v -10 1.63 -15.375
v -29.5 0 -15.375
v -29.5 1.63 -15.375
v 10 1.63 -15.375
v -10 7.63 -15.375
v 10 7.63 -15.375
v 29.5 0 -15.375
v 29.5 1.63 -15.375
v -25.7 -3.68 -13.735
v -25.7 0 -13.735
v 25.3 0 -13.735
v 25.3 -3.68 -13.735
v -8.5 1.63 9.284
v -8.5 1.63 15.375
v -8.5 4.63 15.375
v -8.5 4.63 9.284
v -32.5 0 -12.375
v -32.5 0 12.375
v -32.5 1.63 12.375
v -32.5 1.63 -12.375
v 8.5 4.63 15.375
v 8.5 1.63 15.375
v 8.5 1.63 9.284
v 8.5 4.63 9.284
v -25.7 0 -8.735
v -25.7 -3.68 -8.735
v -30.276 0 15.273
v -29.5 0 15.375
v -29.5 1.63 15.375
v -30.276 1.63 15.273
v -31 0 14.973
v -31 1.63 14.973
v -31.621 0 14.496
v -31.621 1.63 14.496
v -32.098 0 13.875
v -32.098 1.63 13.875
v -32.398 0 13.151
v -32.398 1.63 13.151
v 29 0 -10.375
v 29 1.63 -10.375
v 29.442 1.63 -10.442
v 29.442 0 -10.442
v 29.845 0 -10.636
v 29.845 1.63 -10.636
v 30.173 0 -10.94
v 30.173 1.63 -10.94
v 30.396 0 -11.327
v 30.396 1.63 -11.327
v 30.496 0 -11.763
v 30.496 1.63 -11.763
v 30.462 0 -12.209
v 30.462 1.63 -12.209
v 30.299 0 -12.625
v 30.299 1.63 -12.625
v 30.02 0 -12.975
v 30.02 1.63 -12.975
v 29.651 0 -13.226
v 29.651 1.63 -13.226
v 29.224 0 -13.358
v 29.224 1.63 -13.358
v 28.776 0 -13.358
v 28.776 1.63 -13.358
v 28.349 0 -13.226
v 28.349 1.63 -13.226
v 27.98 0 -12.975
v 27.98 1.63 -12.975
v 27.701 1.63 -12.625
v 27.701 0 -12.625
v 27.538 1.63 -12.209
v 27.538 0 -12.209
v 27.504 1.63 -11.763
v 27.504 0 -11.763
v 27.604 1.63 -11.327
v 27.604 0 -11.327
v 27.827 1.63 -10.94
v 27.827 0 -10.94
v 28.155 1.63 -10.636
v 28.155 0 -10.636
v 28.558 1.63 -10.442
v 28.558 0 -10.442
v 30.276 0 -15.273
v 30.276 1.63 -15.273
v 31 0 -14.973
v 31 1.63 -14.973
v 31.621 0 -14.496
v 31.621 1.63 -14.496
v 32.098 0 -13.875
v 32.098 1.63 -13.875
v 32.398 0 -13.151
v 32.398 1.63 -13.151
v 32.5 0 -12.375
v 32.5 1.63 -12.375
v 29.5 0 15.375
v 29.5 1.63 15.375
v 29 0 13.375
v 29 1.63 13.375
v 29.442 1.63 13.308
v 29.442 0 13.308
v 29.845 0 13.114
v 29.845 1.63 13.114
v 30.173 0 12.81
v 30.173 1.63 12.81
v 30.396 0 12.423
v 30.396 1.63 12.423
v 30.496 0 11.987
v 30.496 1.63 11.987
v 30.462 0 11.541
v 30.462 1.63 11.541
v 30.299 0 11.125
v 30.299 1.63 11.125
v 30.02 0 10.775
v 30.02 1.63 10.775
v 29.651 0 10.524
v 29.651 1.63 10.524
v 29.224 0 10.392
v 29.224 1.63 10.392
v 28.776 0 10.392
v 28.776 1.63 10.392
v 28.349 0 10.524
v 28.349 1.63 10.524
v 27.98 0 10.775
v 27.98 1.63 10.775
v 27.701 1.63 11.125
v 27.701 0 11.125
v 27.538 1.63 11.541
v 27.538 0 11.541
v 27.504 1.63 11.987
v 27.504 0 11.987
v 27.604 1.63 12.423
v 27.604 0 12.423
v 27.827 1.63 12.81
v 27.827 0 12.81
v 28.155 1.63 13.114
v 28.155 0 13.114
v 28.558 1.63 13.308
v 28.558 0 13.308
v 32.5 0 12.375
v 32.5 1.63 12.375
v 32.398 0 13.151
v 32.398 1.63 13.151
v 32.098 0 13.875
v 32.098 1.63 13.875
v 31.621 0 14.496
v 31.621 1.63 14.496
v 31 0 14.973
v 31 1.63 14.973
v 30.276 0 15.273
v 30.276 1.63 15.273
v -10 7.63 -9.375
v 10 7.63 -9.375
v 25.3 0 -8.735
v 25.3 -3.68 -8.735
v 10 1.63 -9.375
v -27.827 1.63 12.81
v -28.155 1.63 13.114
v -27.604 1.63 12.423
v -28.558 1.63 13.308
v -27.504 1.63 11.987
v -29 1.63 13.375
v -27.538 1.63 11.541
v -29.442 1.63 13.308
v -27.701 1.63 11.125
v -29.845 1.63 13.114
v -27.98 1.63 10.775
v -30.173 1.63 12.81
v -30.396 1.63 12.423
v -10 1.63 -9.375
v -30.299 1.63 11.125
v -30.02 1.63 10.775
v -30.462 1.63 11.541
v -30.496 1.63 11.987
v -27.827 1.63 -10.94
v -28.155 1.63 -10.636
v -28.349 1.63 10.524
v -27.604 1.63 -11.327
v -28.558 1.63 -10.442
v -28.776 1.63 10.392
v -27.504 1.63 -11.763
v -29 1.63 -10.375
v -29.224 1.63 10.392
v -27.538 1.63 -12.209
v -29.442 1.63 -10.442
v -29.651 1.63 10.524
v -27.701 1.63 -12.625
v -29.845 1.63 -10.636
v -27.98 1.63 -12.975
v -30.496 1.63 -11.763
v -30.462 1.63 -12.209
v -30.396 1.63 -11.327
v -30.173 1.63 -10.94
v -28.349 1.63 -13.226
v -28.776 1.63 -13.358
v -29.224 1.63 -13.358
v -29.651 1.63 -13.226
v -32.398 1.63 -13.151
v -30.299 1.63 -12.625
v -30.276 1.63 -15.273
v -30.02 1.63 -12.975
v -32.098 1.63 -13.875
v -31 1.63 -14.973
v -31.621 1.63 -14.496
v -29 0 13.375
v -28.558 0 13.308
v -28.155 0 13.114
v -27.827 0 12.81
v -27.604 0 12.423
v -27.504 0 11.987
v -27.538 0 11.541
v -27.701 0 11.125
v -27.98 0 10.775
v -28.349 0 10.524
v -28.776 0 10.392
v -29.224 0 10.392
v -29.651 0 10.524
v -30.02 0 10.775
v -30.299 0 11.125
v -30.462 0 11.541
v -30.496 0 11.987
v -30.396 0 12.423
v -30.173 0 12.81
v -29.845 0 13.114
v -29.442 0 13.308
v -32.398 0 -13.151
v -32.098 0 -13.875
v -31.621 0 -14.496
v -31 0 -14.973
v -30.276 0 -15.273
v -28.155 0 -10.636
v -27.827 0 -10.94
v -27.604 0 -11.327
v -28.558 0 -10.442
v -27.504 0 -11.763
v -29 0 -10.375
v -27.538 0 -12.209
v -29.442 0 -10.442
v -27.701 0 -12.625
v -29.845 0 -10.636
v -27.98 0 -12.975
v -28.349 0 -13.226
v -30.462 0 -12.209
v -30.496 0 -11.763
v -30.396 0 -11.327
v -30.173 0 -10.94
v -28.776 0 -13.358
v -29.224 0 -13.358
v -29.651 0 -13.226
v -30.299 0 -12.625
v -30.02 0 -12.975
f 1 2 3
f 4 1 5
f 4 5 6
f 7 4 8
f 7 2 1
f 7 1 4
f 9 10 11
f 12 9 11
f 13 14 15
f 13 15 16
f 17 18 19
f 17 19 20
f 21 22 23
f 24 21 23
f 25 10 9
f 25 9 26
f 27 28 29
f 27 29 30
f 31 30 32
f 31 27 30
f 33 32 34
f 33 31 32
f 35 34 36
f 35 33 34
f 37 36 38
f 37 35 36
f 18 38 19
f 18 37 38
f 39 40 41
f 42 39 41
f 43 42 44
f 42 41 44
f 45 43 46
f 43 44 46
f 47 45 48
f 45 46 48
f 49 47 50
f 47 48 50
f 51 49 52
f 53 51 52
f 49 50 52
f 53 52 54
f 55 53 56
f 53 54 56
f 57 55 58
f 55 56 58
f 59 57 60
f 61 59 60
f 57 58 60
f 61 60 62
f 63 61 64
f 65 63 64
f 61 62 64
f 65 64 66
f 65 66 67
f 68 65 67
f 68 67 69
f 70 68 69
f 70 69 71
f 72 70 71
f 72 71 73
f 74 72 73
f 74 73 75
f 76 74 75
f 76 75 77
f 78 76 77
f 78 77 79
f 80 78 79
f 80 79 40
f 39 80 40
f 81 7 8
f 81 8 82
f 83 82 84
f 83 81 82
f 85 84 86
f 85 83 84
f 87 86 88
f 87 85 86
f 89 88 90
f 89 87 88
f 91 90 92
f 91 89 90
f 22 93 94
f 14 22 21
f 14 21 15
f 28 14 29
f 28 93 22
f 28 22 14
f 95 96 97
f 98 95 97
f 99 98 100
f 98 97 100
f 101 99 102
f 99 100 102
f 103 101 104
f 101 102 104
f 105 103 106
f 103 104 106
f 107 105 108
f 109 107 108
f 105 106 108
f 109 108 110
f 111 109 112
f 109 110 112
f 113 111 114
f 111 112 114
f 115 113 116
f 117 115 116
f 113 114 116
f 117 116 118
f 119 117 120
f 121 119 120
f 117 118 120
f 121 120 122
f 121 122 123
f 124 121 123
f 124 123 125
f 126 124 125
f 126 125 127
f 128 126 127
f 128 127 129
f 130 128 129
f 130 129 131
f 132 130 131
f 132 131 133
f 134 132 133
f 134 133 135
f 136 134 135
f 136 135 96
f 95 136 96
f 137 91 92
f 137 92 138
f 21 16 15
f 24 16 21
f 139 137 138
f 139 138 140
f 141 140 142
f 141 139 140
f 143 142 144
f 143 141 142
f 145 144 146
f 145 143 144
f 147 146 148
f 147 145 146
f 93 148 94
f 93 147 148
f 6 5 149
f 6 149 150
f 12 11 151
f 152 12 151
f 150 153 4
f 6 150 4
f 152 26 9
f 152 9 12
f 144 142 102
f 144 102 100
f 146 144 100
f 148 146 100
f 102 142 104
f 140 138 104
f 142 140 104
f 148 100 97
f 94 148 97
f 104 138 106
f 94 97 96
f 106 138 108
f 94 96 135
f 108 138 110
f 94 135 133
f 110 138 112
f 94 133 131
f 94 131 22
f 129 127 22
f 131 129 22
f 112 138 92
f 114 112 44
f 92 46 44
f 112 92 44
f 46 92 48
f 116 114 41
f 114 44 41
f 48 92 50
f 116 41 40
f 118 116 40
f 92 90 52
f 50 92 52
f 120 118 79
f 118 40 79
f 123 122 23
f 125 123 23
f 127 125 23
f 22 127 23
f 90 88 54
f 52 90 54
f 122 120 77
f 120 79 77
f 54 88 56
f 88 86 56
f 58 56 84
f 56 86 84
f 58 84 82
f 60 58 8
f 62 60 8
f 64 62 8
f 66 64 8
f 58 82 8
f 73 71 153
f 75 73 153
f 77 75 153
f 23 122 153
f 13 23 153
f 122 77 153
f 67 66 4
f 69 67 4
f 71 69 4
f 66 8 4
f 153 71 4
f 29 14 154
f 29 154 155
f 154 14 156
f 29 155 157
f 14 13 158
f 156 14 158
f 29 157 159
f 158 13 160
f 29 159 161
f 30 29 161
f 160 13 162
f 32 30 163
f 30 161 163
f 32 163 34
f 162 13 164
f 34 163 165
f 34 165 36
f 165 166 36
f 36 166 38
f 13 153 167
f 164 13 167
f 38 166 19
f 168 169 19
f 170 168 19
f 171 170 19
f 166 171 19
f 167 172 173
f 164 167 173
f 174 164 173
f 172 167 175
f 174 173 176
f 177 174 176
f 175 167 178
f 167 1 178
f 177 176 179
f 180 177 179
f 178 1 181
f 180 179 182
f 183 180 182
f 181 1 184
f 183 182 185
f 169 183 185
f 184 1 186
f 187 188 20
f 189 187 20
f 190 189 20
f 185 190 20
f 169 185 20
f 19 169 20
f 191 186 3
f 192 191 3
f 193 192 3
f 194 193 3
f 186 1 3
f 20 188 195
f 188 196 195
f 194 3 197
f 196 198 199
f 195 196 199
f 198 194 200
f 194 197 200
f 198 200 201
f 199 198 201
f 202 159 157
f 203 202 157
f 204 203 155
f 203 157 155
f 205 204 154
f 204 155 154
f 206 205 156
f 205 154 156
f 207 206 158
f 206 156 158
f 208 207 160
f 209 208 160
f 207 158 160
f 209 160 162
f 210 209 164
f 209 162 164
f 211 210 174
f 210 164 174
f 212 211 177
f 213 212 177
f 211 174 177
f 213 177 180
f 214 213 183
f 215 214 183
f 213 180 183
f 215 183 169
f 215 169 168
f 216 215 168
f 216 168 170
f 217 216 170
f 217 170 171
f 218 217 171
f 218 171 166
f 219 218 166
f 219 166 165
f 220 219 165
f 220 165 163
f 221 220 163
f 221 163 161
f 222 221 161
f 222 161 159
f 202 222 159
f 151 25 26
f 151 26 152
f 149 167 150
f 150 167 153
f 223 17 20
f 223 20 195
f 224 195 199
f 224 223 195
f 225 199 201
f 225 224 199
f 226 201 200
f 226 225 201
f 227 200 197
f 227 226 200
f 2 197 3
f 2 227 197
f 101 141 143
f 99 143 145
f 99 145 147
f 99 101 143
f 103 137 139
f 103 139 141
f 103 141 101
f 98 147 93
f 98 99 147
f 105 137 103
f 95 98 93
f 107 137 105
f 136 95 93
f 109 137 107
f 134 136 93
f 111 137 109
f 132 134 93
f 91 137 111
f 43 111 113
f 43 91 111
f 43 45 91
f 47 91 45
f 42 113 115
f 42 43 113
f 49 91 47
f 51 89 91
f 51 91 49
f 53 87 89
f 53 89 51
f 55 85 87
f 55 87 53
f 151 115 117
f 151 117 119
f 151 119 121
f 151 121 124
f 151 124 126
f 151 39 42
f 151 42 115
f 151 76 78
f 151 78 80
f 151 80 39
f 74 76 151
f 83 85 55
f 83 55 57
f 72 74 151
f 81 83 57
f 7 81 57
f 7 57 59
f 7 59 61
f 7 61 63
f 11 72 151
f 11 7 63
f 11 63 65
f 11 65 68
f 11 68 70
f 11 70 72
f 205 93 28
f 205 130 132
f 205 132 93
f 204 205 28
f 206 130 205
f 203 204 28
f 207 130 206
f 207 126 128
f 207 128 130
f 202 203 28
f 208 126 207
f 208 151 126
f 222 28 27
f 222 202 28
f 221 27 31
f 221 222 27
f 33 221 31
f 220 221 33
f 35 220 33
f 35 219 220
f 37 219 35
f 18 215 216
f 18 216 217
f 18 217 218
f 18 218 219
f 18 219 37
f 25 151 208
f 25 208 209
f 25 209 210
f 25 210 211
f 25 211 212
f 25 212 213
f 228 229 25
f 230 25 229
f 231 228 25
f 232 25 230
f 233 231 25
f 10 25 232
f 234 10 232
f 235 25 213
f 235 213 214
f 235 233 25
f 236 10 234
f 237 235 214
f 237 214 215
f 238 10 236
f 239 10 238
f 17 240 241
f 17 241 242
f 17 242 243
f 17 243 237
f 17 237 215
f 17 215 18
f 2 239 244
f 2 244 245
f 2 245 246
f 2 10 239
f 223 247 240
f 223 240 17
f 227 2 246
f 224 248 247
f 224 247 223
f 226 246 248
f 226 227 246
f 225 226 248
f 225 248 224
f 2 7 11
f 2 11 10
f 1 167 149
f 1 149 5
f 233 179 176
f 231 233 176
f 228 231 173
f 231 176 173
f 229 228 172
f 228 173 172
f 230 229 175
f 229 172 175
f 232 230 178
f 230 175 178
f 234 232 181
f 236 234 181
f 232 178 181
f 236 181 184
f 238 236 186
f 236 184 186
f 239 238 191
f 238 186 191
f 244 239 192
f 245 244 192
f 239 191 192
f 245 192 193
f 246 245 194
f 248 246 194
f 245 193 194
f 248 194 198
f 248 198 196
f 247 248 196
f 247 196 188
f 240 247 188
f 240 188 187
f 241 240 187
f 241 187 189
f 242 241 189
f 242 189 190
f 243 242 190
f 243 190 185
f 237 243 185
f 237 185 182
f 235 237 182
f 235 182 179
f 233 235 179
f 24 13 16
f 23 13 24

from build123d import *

# Parameters (mm, degrees)
EXTRUDE_1_DEPTH     = 1.63
SKETCH_2_R          = 1.5
CUT_EXTRUDE_1_DEPTH = 2.63
SKETCH_8_W          = 51
SKETCH_8_H          = 5
EXTRUDE_6_DEPTH     = 3.68
SKETCH_9_W          = 17
SKETCH_9_H          = 6.090540171
EXTRUDE_7_DEPTH     = 3
SKETCH_10_W         = 20
SKETCH_10_H         = 6
EXTRUDE_8_DEPTH     = 6


with BuildPart() as part:
    # 草图1 → 凸台-拉伸1 (new body)
    with BuildSketch(Plane(origin=(0, 0, 0), x_dir=(1, 0, 0), z_dir=(0, 1, 0))):
        with BuildLine():
            Line((-29.5, 15.375), (29.5, 15.375))
            ThreePointArc((29.5, 15.375), (31.621320344, 14.496320344), (32.5, 12.375))
            Line((32.5, 12.375), (32.5, -12.375))
            ThreePointArc((32.5, -12.375), (31.621320344, -14.496320344), (29.5, -15.375))
            Line((29.5, -15.375), (-29.5, -15.375))
            ThreePointArc((-29.5, -15.375), (-31.621320344, -14.496320344), (-32.5, -12.375))
            Line((-32.5, -12.375), (-32.5, 12.375))
            ThreePointArc((-32.5, 12.375), (-31.621320344, 14.496320344), (-29.5, 15.375))
        make_face()
    extrude(amount=EXTRUDE_1_DEPTH)

    # 草图2 → 切除-拉伸1 (cut, through all)
    with BuildSketch(Plane(origin=(0, 1.63, 0), x_dir=(1, 0, 0), z_dir=(0, 1, 0))):
        with Locations(Location((-29, 11.875, 0), (0, 0, 270))):  # turned: the seam where the file's is
            Circle(SKETCH_2_R)
        with Locations(Location((-29, -11.875, 0), (0, 0, 270))):  # turned: the seam where the file's is
            Circle(SKETCH_2_R)
        with Locations(Location((29, -11.875, 0), (0, 0, 270))):  # turned: the seam where the file's is
            Circle(SKETCH_2_R)
        with Locations(Location((29, 11.875, 0), (0, 0, 270))):  # turned: the seam where the file's is
            Circle(SKETCH_2_R)
    extrude(amount=-CUT_EXTRUDE_1_DEPTH, mode=Mode.SUBTRACT)

    # 草图8 → 凸台-拉伸6 (add)
    with BuildSketch(Plane.XZ):
        with Locations((-0.2, -11.235)):
            Rectangle(SKETCH_8_W, SKETCH_8_H)
    extrude(amount=EXTRUDE_6_DEPTH)

    # 草图9 → 凸台-拉伸7 (add)
    with BuildSketch(Plane(origin=(0, 1.63, 0), x_dir=(1, 0, 0), z_dir=(0, 1, 0))):
        with Locations((0, -12.329729915)):
            Rectangle(SKETCH_9_W, SKETCH_9_H)
    extrude(amount=EXTRUDE_7_DEPTH)

    # 草图10 → 凸台-拉伸8 (add)
    with BuildSketch(Plane(origin=(0, 1.63, 0), x_dir=(1, 0, 0), z_dir=(0, 1, 0))):
        with Locations((0, 12.375)):
            Rectangle(SKETCH_10_W, SKETCH_10_H)
    extrude(amount=EXTRUDE_8_DEPTH)


solid = part.part
